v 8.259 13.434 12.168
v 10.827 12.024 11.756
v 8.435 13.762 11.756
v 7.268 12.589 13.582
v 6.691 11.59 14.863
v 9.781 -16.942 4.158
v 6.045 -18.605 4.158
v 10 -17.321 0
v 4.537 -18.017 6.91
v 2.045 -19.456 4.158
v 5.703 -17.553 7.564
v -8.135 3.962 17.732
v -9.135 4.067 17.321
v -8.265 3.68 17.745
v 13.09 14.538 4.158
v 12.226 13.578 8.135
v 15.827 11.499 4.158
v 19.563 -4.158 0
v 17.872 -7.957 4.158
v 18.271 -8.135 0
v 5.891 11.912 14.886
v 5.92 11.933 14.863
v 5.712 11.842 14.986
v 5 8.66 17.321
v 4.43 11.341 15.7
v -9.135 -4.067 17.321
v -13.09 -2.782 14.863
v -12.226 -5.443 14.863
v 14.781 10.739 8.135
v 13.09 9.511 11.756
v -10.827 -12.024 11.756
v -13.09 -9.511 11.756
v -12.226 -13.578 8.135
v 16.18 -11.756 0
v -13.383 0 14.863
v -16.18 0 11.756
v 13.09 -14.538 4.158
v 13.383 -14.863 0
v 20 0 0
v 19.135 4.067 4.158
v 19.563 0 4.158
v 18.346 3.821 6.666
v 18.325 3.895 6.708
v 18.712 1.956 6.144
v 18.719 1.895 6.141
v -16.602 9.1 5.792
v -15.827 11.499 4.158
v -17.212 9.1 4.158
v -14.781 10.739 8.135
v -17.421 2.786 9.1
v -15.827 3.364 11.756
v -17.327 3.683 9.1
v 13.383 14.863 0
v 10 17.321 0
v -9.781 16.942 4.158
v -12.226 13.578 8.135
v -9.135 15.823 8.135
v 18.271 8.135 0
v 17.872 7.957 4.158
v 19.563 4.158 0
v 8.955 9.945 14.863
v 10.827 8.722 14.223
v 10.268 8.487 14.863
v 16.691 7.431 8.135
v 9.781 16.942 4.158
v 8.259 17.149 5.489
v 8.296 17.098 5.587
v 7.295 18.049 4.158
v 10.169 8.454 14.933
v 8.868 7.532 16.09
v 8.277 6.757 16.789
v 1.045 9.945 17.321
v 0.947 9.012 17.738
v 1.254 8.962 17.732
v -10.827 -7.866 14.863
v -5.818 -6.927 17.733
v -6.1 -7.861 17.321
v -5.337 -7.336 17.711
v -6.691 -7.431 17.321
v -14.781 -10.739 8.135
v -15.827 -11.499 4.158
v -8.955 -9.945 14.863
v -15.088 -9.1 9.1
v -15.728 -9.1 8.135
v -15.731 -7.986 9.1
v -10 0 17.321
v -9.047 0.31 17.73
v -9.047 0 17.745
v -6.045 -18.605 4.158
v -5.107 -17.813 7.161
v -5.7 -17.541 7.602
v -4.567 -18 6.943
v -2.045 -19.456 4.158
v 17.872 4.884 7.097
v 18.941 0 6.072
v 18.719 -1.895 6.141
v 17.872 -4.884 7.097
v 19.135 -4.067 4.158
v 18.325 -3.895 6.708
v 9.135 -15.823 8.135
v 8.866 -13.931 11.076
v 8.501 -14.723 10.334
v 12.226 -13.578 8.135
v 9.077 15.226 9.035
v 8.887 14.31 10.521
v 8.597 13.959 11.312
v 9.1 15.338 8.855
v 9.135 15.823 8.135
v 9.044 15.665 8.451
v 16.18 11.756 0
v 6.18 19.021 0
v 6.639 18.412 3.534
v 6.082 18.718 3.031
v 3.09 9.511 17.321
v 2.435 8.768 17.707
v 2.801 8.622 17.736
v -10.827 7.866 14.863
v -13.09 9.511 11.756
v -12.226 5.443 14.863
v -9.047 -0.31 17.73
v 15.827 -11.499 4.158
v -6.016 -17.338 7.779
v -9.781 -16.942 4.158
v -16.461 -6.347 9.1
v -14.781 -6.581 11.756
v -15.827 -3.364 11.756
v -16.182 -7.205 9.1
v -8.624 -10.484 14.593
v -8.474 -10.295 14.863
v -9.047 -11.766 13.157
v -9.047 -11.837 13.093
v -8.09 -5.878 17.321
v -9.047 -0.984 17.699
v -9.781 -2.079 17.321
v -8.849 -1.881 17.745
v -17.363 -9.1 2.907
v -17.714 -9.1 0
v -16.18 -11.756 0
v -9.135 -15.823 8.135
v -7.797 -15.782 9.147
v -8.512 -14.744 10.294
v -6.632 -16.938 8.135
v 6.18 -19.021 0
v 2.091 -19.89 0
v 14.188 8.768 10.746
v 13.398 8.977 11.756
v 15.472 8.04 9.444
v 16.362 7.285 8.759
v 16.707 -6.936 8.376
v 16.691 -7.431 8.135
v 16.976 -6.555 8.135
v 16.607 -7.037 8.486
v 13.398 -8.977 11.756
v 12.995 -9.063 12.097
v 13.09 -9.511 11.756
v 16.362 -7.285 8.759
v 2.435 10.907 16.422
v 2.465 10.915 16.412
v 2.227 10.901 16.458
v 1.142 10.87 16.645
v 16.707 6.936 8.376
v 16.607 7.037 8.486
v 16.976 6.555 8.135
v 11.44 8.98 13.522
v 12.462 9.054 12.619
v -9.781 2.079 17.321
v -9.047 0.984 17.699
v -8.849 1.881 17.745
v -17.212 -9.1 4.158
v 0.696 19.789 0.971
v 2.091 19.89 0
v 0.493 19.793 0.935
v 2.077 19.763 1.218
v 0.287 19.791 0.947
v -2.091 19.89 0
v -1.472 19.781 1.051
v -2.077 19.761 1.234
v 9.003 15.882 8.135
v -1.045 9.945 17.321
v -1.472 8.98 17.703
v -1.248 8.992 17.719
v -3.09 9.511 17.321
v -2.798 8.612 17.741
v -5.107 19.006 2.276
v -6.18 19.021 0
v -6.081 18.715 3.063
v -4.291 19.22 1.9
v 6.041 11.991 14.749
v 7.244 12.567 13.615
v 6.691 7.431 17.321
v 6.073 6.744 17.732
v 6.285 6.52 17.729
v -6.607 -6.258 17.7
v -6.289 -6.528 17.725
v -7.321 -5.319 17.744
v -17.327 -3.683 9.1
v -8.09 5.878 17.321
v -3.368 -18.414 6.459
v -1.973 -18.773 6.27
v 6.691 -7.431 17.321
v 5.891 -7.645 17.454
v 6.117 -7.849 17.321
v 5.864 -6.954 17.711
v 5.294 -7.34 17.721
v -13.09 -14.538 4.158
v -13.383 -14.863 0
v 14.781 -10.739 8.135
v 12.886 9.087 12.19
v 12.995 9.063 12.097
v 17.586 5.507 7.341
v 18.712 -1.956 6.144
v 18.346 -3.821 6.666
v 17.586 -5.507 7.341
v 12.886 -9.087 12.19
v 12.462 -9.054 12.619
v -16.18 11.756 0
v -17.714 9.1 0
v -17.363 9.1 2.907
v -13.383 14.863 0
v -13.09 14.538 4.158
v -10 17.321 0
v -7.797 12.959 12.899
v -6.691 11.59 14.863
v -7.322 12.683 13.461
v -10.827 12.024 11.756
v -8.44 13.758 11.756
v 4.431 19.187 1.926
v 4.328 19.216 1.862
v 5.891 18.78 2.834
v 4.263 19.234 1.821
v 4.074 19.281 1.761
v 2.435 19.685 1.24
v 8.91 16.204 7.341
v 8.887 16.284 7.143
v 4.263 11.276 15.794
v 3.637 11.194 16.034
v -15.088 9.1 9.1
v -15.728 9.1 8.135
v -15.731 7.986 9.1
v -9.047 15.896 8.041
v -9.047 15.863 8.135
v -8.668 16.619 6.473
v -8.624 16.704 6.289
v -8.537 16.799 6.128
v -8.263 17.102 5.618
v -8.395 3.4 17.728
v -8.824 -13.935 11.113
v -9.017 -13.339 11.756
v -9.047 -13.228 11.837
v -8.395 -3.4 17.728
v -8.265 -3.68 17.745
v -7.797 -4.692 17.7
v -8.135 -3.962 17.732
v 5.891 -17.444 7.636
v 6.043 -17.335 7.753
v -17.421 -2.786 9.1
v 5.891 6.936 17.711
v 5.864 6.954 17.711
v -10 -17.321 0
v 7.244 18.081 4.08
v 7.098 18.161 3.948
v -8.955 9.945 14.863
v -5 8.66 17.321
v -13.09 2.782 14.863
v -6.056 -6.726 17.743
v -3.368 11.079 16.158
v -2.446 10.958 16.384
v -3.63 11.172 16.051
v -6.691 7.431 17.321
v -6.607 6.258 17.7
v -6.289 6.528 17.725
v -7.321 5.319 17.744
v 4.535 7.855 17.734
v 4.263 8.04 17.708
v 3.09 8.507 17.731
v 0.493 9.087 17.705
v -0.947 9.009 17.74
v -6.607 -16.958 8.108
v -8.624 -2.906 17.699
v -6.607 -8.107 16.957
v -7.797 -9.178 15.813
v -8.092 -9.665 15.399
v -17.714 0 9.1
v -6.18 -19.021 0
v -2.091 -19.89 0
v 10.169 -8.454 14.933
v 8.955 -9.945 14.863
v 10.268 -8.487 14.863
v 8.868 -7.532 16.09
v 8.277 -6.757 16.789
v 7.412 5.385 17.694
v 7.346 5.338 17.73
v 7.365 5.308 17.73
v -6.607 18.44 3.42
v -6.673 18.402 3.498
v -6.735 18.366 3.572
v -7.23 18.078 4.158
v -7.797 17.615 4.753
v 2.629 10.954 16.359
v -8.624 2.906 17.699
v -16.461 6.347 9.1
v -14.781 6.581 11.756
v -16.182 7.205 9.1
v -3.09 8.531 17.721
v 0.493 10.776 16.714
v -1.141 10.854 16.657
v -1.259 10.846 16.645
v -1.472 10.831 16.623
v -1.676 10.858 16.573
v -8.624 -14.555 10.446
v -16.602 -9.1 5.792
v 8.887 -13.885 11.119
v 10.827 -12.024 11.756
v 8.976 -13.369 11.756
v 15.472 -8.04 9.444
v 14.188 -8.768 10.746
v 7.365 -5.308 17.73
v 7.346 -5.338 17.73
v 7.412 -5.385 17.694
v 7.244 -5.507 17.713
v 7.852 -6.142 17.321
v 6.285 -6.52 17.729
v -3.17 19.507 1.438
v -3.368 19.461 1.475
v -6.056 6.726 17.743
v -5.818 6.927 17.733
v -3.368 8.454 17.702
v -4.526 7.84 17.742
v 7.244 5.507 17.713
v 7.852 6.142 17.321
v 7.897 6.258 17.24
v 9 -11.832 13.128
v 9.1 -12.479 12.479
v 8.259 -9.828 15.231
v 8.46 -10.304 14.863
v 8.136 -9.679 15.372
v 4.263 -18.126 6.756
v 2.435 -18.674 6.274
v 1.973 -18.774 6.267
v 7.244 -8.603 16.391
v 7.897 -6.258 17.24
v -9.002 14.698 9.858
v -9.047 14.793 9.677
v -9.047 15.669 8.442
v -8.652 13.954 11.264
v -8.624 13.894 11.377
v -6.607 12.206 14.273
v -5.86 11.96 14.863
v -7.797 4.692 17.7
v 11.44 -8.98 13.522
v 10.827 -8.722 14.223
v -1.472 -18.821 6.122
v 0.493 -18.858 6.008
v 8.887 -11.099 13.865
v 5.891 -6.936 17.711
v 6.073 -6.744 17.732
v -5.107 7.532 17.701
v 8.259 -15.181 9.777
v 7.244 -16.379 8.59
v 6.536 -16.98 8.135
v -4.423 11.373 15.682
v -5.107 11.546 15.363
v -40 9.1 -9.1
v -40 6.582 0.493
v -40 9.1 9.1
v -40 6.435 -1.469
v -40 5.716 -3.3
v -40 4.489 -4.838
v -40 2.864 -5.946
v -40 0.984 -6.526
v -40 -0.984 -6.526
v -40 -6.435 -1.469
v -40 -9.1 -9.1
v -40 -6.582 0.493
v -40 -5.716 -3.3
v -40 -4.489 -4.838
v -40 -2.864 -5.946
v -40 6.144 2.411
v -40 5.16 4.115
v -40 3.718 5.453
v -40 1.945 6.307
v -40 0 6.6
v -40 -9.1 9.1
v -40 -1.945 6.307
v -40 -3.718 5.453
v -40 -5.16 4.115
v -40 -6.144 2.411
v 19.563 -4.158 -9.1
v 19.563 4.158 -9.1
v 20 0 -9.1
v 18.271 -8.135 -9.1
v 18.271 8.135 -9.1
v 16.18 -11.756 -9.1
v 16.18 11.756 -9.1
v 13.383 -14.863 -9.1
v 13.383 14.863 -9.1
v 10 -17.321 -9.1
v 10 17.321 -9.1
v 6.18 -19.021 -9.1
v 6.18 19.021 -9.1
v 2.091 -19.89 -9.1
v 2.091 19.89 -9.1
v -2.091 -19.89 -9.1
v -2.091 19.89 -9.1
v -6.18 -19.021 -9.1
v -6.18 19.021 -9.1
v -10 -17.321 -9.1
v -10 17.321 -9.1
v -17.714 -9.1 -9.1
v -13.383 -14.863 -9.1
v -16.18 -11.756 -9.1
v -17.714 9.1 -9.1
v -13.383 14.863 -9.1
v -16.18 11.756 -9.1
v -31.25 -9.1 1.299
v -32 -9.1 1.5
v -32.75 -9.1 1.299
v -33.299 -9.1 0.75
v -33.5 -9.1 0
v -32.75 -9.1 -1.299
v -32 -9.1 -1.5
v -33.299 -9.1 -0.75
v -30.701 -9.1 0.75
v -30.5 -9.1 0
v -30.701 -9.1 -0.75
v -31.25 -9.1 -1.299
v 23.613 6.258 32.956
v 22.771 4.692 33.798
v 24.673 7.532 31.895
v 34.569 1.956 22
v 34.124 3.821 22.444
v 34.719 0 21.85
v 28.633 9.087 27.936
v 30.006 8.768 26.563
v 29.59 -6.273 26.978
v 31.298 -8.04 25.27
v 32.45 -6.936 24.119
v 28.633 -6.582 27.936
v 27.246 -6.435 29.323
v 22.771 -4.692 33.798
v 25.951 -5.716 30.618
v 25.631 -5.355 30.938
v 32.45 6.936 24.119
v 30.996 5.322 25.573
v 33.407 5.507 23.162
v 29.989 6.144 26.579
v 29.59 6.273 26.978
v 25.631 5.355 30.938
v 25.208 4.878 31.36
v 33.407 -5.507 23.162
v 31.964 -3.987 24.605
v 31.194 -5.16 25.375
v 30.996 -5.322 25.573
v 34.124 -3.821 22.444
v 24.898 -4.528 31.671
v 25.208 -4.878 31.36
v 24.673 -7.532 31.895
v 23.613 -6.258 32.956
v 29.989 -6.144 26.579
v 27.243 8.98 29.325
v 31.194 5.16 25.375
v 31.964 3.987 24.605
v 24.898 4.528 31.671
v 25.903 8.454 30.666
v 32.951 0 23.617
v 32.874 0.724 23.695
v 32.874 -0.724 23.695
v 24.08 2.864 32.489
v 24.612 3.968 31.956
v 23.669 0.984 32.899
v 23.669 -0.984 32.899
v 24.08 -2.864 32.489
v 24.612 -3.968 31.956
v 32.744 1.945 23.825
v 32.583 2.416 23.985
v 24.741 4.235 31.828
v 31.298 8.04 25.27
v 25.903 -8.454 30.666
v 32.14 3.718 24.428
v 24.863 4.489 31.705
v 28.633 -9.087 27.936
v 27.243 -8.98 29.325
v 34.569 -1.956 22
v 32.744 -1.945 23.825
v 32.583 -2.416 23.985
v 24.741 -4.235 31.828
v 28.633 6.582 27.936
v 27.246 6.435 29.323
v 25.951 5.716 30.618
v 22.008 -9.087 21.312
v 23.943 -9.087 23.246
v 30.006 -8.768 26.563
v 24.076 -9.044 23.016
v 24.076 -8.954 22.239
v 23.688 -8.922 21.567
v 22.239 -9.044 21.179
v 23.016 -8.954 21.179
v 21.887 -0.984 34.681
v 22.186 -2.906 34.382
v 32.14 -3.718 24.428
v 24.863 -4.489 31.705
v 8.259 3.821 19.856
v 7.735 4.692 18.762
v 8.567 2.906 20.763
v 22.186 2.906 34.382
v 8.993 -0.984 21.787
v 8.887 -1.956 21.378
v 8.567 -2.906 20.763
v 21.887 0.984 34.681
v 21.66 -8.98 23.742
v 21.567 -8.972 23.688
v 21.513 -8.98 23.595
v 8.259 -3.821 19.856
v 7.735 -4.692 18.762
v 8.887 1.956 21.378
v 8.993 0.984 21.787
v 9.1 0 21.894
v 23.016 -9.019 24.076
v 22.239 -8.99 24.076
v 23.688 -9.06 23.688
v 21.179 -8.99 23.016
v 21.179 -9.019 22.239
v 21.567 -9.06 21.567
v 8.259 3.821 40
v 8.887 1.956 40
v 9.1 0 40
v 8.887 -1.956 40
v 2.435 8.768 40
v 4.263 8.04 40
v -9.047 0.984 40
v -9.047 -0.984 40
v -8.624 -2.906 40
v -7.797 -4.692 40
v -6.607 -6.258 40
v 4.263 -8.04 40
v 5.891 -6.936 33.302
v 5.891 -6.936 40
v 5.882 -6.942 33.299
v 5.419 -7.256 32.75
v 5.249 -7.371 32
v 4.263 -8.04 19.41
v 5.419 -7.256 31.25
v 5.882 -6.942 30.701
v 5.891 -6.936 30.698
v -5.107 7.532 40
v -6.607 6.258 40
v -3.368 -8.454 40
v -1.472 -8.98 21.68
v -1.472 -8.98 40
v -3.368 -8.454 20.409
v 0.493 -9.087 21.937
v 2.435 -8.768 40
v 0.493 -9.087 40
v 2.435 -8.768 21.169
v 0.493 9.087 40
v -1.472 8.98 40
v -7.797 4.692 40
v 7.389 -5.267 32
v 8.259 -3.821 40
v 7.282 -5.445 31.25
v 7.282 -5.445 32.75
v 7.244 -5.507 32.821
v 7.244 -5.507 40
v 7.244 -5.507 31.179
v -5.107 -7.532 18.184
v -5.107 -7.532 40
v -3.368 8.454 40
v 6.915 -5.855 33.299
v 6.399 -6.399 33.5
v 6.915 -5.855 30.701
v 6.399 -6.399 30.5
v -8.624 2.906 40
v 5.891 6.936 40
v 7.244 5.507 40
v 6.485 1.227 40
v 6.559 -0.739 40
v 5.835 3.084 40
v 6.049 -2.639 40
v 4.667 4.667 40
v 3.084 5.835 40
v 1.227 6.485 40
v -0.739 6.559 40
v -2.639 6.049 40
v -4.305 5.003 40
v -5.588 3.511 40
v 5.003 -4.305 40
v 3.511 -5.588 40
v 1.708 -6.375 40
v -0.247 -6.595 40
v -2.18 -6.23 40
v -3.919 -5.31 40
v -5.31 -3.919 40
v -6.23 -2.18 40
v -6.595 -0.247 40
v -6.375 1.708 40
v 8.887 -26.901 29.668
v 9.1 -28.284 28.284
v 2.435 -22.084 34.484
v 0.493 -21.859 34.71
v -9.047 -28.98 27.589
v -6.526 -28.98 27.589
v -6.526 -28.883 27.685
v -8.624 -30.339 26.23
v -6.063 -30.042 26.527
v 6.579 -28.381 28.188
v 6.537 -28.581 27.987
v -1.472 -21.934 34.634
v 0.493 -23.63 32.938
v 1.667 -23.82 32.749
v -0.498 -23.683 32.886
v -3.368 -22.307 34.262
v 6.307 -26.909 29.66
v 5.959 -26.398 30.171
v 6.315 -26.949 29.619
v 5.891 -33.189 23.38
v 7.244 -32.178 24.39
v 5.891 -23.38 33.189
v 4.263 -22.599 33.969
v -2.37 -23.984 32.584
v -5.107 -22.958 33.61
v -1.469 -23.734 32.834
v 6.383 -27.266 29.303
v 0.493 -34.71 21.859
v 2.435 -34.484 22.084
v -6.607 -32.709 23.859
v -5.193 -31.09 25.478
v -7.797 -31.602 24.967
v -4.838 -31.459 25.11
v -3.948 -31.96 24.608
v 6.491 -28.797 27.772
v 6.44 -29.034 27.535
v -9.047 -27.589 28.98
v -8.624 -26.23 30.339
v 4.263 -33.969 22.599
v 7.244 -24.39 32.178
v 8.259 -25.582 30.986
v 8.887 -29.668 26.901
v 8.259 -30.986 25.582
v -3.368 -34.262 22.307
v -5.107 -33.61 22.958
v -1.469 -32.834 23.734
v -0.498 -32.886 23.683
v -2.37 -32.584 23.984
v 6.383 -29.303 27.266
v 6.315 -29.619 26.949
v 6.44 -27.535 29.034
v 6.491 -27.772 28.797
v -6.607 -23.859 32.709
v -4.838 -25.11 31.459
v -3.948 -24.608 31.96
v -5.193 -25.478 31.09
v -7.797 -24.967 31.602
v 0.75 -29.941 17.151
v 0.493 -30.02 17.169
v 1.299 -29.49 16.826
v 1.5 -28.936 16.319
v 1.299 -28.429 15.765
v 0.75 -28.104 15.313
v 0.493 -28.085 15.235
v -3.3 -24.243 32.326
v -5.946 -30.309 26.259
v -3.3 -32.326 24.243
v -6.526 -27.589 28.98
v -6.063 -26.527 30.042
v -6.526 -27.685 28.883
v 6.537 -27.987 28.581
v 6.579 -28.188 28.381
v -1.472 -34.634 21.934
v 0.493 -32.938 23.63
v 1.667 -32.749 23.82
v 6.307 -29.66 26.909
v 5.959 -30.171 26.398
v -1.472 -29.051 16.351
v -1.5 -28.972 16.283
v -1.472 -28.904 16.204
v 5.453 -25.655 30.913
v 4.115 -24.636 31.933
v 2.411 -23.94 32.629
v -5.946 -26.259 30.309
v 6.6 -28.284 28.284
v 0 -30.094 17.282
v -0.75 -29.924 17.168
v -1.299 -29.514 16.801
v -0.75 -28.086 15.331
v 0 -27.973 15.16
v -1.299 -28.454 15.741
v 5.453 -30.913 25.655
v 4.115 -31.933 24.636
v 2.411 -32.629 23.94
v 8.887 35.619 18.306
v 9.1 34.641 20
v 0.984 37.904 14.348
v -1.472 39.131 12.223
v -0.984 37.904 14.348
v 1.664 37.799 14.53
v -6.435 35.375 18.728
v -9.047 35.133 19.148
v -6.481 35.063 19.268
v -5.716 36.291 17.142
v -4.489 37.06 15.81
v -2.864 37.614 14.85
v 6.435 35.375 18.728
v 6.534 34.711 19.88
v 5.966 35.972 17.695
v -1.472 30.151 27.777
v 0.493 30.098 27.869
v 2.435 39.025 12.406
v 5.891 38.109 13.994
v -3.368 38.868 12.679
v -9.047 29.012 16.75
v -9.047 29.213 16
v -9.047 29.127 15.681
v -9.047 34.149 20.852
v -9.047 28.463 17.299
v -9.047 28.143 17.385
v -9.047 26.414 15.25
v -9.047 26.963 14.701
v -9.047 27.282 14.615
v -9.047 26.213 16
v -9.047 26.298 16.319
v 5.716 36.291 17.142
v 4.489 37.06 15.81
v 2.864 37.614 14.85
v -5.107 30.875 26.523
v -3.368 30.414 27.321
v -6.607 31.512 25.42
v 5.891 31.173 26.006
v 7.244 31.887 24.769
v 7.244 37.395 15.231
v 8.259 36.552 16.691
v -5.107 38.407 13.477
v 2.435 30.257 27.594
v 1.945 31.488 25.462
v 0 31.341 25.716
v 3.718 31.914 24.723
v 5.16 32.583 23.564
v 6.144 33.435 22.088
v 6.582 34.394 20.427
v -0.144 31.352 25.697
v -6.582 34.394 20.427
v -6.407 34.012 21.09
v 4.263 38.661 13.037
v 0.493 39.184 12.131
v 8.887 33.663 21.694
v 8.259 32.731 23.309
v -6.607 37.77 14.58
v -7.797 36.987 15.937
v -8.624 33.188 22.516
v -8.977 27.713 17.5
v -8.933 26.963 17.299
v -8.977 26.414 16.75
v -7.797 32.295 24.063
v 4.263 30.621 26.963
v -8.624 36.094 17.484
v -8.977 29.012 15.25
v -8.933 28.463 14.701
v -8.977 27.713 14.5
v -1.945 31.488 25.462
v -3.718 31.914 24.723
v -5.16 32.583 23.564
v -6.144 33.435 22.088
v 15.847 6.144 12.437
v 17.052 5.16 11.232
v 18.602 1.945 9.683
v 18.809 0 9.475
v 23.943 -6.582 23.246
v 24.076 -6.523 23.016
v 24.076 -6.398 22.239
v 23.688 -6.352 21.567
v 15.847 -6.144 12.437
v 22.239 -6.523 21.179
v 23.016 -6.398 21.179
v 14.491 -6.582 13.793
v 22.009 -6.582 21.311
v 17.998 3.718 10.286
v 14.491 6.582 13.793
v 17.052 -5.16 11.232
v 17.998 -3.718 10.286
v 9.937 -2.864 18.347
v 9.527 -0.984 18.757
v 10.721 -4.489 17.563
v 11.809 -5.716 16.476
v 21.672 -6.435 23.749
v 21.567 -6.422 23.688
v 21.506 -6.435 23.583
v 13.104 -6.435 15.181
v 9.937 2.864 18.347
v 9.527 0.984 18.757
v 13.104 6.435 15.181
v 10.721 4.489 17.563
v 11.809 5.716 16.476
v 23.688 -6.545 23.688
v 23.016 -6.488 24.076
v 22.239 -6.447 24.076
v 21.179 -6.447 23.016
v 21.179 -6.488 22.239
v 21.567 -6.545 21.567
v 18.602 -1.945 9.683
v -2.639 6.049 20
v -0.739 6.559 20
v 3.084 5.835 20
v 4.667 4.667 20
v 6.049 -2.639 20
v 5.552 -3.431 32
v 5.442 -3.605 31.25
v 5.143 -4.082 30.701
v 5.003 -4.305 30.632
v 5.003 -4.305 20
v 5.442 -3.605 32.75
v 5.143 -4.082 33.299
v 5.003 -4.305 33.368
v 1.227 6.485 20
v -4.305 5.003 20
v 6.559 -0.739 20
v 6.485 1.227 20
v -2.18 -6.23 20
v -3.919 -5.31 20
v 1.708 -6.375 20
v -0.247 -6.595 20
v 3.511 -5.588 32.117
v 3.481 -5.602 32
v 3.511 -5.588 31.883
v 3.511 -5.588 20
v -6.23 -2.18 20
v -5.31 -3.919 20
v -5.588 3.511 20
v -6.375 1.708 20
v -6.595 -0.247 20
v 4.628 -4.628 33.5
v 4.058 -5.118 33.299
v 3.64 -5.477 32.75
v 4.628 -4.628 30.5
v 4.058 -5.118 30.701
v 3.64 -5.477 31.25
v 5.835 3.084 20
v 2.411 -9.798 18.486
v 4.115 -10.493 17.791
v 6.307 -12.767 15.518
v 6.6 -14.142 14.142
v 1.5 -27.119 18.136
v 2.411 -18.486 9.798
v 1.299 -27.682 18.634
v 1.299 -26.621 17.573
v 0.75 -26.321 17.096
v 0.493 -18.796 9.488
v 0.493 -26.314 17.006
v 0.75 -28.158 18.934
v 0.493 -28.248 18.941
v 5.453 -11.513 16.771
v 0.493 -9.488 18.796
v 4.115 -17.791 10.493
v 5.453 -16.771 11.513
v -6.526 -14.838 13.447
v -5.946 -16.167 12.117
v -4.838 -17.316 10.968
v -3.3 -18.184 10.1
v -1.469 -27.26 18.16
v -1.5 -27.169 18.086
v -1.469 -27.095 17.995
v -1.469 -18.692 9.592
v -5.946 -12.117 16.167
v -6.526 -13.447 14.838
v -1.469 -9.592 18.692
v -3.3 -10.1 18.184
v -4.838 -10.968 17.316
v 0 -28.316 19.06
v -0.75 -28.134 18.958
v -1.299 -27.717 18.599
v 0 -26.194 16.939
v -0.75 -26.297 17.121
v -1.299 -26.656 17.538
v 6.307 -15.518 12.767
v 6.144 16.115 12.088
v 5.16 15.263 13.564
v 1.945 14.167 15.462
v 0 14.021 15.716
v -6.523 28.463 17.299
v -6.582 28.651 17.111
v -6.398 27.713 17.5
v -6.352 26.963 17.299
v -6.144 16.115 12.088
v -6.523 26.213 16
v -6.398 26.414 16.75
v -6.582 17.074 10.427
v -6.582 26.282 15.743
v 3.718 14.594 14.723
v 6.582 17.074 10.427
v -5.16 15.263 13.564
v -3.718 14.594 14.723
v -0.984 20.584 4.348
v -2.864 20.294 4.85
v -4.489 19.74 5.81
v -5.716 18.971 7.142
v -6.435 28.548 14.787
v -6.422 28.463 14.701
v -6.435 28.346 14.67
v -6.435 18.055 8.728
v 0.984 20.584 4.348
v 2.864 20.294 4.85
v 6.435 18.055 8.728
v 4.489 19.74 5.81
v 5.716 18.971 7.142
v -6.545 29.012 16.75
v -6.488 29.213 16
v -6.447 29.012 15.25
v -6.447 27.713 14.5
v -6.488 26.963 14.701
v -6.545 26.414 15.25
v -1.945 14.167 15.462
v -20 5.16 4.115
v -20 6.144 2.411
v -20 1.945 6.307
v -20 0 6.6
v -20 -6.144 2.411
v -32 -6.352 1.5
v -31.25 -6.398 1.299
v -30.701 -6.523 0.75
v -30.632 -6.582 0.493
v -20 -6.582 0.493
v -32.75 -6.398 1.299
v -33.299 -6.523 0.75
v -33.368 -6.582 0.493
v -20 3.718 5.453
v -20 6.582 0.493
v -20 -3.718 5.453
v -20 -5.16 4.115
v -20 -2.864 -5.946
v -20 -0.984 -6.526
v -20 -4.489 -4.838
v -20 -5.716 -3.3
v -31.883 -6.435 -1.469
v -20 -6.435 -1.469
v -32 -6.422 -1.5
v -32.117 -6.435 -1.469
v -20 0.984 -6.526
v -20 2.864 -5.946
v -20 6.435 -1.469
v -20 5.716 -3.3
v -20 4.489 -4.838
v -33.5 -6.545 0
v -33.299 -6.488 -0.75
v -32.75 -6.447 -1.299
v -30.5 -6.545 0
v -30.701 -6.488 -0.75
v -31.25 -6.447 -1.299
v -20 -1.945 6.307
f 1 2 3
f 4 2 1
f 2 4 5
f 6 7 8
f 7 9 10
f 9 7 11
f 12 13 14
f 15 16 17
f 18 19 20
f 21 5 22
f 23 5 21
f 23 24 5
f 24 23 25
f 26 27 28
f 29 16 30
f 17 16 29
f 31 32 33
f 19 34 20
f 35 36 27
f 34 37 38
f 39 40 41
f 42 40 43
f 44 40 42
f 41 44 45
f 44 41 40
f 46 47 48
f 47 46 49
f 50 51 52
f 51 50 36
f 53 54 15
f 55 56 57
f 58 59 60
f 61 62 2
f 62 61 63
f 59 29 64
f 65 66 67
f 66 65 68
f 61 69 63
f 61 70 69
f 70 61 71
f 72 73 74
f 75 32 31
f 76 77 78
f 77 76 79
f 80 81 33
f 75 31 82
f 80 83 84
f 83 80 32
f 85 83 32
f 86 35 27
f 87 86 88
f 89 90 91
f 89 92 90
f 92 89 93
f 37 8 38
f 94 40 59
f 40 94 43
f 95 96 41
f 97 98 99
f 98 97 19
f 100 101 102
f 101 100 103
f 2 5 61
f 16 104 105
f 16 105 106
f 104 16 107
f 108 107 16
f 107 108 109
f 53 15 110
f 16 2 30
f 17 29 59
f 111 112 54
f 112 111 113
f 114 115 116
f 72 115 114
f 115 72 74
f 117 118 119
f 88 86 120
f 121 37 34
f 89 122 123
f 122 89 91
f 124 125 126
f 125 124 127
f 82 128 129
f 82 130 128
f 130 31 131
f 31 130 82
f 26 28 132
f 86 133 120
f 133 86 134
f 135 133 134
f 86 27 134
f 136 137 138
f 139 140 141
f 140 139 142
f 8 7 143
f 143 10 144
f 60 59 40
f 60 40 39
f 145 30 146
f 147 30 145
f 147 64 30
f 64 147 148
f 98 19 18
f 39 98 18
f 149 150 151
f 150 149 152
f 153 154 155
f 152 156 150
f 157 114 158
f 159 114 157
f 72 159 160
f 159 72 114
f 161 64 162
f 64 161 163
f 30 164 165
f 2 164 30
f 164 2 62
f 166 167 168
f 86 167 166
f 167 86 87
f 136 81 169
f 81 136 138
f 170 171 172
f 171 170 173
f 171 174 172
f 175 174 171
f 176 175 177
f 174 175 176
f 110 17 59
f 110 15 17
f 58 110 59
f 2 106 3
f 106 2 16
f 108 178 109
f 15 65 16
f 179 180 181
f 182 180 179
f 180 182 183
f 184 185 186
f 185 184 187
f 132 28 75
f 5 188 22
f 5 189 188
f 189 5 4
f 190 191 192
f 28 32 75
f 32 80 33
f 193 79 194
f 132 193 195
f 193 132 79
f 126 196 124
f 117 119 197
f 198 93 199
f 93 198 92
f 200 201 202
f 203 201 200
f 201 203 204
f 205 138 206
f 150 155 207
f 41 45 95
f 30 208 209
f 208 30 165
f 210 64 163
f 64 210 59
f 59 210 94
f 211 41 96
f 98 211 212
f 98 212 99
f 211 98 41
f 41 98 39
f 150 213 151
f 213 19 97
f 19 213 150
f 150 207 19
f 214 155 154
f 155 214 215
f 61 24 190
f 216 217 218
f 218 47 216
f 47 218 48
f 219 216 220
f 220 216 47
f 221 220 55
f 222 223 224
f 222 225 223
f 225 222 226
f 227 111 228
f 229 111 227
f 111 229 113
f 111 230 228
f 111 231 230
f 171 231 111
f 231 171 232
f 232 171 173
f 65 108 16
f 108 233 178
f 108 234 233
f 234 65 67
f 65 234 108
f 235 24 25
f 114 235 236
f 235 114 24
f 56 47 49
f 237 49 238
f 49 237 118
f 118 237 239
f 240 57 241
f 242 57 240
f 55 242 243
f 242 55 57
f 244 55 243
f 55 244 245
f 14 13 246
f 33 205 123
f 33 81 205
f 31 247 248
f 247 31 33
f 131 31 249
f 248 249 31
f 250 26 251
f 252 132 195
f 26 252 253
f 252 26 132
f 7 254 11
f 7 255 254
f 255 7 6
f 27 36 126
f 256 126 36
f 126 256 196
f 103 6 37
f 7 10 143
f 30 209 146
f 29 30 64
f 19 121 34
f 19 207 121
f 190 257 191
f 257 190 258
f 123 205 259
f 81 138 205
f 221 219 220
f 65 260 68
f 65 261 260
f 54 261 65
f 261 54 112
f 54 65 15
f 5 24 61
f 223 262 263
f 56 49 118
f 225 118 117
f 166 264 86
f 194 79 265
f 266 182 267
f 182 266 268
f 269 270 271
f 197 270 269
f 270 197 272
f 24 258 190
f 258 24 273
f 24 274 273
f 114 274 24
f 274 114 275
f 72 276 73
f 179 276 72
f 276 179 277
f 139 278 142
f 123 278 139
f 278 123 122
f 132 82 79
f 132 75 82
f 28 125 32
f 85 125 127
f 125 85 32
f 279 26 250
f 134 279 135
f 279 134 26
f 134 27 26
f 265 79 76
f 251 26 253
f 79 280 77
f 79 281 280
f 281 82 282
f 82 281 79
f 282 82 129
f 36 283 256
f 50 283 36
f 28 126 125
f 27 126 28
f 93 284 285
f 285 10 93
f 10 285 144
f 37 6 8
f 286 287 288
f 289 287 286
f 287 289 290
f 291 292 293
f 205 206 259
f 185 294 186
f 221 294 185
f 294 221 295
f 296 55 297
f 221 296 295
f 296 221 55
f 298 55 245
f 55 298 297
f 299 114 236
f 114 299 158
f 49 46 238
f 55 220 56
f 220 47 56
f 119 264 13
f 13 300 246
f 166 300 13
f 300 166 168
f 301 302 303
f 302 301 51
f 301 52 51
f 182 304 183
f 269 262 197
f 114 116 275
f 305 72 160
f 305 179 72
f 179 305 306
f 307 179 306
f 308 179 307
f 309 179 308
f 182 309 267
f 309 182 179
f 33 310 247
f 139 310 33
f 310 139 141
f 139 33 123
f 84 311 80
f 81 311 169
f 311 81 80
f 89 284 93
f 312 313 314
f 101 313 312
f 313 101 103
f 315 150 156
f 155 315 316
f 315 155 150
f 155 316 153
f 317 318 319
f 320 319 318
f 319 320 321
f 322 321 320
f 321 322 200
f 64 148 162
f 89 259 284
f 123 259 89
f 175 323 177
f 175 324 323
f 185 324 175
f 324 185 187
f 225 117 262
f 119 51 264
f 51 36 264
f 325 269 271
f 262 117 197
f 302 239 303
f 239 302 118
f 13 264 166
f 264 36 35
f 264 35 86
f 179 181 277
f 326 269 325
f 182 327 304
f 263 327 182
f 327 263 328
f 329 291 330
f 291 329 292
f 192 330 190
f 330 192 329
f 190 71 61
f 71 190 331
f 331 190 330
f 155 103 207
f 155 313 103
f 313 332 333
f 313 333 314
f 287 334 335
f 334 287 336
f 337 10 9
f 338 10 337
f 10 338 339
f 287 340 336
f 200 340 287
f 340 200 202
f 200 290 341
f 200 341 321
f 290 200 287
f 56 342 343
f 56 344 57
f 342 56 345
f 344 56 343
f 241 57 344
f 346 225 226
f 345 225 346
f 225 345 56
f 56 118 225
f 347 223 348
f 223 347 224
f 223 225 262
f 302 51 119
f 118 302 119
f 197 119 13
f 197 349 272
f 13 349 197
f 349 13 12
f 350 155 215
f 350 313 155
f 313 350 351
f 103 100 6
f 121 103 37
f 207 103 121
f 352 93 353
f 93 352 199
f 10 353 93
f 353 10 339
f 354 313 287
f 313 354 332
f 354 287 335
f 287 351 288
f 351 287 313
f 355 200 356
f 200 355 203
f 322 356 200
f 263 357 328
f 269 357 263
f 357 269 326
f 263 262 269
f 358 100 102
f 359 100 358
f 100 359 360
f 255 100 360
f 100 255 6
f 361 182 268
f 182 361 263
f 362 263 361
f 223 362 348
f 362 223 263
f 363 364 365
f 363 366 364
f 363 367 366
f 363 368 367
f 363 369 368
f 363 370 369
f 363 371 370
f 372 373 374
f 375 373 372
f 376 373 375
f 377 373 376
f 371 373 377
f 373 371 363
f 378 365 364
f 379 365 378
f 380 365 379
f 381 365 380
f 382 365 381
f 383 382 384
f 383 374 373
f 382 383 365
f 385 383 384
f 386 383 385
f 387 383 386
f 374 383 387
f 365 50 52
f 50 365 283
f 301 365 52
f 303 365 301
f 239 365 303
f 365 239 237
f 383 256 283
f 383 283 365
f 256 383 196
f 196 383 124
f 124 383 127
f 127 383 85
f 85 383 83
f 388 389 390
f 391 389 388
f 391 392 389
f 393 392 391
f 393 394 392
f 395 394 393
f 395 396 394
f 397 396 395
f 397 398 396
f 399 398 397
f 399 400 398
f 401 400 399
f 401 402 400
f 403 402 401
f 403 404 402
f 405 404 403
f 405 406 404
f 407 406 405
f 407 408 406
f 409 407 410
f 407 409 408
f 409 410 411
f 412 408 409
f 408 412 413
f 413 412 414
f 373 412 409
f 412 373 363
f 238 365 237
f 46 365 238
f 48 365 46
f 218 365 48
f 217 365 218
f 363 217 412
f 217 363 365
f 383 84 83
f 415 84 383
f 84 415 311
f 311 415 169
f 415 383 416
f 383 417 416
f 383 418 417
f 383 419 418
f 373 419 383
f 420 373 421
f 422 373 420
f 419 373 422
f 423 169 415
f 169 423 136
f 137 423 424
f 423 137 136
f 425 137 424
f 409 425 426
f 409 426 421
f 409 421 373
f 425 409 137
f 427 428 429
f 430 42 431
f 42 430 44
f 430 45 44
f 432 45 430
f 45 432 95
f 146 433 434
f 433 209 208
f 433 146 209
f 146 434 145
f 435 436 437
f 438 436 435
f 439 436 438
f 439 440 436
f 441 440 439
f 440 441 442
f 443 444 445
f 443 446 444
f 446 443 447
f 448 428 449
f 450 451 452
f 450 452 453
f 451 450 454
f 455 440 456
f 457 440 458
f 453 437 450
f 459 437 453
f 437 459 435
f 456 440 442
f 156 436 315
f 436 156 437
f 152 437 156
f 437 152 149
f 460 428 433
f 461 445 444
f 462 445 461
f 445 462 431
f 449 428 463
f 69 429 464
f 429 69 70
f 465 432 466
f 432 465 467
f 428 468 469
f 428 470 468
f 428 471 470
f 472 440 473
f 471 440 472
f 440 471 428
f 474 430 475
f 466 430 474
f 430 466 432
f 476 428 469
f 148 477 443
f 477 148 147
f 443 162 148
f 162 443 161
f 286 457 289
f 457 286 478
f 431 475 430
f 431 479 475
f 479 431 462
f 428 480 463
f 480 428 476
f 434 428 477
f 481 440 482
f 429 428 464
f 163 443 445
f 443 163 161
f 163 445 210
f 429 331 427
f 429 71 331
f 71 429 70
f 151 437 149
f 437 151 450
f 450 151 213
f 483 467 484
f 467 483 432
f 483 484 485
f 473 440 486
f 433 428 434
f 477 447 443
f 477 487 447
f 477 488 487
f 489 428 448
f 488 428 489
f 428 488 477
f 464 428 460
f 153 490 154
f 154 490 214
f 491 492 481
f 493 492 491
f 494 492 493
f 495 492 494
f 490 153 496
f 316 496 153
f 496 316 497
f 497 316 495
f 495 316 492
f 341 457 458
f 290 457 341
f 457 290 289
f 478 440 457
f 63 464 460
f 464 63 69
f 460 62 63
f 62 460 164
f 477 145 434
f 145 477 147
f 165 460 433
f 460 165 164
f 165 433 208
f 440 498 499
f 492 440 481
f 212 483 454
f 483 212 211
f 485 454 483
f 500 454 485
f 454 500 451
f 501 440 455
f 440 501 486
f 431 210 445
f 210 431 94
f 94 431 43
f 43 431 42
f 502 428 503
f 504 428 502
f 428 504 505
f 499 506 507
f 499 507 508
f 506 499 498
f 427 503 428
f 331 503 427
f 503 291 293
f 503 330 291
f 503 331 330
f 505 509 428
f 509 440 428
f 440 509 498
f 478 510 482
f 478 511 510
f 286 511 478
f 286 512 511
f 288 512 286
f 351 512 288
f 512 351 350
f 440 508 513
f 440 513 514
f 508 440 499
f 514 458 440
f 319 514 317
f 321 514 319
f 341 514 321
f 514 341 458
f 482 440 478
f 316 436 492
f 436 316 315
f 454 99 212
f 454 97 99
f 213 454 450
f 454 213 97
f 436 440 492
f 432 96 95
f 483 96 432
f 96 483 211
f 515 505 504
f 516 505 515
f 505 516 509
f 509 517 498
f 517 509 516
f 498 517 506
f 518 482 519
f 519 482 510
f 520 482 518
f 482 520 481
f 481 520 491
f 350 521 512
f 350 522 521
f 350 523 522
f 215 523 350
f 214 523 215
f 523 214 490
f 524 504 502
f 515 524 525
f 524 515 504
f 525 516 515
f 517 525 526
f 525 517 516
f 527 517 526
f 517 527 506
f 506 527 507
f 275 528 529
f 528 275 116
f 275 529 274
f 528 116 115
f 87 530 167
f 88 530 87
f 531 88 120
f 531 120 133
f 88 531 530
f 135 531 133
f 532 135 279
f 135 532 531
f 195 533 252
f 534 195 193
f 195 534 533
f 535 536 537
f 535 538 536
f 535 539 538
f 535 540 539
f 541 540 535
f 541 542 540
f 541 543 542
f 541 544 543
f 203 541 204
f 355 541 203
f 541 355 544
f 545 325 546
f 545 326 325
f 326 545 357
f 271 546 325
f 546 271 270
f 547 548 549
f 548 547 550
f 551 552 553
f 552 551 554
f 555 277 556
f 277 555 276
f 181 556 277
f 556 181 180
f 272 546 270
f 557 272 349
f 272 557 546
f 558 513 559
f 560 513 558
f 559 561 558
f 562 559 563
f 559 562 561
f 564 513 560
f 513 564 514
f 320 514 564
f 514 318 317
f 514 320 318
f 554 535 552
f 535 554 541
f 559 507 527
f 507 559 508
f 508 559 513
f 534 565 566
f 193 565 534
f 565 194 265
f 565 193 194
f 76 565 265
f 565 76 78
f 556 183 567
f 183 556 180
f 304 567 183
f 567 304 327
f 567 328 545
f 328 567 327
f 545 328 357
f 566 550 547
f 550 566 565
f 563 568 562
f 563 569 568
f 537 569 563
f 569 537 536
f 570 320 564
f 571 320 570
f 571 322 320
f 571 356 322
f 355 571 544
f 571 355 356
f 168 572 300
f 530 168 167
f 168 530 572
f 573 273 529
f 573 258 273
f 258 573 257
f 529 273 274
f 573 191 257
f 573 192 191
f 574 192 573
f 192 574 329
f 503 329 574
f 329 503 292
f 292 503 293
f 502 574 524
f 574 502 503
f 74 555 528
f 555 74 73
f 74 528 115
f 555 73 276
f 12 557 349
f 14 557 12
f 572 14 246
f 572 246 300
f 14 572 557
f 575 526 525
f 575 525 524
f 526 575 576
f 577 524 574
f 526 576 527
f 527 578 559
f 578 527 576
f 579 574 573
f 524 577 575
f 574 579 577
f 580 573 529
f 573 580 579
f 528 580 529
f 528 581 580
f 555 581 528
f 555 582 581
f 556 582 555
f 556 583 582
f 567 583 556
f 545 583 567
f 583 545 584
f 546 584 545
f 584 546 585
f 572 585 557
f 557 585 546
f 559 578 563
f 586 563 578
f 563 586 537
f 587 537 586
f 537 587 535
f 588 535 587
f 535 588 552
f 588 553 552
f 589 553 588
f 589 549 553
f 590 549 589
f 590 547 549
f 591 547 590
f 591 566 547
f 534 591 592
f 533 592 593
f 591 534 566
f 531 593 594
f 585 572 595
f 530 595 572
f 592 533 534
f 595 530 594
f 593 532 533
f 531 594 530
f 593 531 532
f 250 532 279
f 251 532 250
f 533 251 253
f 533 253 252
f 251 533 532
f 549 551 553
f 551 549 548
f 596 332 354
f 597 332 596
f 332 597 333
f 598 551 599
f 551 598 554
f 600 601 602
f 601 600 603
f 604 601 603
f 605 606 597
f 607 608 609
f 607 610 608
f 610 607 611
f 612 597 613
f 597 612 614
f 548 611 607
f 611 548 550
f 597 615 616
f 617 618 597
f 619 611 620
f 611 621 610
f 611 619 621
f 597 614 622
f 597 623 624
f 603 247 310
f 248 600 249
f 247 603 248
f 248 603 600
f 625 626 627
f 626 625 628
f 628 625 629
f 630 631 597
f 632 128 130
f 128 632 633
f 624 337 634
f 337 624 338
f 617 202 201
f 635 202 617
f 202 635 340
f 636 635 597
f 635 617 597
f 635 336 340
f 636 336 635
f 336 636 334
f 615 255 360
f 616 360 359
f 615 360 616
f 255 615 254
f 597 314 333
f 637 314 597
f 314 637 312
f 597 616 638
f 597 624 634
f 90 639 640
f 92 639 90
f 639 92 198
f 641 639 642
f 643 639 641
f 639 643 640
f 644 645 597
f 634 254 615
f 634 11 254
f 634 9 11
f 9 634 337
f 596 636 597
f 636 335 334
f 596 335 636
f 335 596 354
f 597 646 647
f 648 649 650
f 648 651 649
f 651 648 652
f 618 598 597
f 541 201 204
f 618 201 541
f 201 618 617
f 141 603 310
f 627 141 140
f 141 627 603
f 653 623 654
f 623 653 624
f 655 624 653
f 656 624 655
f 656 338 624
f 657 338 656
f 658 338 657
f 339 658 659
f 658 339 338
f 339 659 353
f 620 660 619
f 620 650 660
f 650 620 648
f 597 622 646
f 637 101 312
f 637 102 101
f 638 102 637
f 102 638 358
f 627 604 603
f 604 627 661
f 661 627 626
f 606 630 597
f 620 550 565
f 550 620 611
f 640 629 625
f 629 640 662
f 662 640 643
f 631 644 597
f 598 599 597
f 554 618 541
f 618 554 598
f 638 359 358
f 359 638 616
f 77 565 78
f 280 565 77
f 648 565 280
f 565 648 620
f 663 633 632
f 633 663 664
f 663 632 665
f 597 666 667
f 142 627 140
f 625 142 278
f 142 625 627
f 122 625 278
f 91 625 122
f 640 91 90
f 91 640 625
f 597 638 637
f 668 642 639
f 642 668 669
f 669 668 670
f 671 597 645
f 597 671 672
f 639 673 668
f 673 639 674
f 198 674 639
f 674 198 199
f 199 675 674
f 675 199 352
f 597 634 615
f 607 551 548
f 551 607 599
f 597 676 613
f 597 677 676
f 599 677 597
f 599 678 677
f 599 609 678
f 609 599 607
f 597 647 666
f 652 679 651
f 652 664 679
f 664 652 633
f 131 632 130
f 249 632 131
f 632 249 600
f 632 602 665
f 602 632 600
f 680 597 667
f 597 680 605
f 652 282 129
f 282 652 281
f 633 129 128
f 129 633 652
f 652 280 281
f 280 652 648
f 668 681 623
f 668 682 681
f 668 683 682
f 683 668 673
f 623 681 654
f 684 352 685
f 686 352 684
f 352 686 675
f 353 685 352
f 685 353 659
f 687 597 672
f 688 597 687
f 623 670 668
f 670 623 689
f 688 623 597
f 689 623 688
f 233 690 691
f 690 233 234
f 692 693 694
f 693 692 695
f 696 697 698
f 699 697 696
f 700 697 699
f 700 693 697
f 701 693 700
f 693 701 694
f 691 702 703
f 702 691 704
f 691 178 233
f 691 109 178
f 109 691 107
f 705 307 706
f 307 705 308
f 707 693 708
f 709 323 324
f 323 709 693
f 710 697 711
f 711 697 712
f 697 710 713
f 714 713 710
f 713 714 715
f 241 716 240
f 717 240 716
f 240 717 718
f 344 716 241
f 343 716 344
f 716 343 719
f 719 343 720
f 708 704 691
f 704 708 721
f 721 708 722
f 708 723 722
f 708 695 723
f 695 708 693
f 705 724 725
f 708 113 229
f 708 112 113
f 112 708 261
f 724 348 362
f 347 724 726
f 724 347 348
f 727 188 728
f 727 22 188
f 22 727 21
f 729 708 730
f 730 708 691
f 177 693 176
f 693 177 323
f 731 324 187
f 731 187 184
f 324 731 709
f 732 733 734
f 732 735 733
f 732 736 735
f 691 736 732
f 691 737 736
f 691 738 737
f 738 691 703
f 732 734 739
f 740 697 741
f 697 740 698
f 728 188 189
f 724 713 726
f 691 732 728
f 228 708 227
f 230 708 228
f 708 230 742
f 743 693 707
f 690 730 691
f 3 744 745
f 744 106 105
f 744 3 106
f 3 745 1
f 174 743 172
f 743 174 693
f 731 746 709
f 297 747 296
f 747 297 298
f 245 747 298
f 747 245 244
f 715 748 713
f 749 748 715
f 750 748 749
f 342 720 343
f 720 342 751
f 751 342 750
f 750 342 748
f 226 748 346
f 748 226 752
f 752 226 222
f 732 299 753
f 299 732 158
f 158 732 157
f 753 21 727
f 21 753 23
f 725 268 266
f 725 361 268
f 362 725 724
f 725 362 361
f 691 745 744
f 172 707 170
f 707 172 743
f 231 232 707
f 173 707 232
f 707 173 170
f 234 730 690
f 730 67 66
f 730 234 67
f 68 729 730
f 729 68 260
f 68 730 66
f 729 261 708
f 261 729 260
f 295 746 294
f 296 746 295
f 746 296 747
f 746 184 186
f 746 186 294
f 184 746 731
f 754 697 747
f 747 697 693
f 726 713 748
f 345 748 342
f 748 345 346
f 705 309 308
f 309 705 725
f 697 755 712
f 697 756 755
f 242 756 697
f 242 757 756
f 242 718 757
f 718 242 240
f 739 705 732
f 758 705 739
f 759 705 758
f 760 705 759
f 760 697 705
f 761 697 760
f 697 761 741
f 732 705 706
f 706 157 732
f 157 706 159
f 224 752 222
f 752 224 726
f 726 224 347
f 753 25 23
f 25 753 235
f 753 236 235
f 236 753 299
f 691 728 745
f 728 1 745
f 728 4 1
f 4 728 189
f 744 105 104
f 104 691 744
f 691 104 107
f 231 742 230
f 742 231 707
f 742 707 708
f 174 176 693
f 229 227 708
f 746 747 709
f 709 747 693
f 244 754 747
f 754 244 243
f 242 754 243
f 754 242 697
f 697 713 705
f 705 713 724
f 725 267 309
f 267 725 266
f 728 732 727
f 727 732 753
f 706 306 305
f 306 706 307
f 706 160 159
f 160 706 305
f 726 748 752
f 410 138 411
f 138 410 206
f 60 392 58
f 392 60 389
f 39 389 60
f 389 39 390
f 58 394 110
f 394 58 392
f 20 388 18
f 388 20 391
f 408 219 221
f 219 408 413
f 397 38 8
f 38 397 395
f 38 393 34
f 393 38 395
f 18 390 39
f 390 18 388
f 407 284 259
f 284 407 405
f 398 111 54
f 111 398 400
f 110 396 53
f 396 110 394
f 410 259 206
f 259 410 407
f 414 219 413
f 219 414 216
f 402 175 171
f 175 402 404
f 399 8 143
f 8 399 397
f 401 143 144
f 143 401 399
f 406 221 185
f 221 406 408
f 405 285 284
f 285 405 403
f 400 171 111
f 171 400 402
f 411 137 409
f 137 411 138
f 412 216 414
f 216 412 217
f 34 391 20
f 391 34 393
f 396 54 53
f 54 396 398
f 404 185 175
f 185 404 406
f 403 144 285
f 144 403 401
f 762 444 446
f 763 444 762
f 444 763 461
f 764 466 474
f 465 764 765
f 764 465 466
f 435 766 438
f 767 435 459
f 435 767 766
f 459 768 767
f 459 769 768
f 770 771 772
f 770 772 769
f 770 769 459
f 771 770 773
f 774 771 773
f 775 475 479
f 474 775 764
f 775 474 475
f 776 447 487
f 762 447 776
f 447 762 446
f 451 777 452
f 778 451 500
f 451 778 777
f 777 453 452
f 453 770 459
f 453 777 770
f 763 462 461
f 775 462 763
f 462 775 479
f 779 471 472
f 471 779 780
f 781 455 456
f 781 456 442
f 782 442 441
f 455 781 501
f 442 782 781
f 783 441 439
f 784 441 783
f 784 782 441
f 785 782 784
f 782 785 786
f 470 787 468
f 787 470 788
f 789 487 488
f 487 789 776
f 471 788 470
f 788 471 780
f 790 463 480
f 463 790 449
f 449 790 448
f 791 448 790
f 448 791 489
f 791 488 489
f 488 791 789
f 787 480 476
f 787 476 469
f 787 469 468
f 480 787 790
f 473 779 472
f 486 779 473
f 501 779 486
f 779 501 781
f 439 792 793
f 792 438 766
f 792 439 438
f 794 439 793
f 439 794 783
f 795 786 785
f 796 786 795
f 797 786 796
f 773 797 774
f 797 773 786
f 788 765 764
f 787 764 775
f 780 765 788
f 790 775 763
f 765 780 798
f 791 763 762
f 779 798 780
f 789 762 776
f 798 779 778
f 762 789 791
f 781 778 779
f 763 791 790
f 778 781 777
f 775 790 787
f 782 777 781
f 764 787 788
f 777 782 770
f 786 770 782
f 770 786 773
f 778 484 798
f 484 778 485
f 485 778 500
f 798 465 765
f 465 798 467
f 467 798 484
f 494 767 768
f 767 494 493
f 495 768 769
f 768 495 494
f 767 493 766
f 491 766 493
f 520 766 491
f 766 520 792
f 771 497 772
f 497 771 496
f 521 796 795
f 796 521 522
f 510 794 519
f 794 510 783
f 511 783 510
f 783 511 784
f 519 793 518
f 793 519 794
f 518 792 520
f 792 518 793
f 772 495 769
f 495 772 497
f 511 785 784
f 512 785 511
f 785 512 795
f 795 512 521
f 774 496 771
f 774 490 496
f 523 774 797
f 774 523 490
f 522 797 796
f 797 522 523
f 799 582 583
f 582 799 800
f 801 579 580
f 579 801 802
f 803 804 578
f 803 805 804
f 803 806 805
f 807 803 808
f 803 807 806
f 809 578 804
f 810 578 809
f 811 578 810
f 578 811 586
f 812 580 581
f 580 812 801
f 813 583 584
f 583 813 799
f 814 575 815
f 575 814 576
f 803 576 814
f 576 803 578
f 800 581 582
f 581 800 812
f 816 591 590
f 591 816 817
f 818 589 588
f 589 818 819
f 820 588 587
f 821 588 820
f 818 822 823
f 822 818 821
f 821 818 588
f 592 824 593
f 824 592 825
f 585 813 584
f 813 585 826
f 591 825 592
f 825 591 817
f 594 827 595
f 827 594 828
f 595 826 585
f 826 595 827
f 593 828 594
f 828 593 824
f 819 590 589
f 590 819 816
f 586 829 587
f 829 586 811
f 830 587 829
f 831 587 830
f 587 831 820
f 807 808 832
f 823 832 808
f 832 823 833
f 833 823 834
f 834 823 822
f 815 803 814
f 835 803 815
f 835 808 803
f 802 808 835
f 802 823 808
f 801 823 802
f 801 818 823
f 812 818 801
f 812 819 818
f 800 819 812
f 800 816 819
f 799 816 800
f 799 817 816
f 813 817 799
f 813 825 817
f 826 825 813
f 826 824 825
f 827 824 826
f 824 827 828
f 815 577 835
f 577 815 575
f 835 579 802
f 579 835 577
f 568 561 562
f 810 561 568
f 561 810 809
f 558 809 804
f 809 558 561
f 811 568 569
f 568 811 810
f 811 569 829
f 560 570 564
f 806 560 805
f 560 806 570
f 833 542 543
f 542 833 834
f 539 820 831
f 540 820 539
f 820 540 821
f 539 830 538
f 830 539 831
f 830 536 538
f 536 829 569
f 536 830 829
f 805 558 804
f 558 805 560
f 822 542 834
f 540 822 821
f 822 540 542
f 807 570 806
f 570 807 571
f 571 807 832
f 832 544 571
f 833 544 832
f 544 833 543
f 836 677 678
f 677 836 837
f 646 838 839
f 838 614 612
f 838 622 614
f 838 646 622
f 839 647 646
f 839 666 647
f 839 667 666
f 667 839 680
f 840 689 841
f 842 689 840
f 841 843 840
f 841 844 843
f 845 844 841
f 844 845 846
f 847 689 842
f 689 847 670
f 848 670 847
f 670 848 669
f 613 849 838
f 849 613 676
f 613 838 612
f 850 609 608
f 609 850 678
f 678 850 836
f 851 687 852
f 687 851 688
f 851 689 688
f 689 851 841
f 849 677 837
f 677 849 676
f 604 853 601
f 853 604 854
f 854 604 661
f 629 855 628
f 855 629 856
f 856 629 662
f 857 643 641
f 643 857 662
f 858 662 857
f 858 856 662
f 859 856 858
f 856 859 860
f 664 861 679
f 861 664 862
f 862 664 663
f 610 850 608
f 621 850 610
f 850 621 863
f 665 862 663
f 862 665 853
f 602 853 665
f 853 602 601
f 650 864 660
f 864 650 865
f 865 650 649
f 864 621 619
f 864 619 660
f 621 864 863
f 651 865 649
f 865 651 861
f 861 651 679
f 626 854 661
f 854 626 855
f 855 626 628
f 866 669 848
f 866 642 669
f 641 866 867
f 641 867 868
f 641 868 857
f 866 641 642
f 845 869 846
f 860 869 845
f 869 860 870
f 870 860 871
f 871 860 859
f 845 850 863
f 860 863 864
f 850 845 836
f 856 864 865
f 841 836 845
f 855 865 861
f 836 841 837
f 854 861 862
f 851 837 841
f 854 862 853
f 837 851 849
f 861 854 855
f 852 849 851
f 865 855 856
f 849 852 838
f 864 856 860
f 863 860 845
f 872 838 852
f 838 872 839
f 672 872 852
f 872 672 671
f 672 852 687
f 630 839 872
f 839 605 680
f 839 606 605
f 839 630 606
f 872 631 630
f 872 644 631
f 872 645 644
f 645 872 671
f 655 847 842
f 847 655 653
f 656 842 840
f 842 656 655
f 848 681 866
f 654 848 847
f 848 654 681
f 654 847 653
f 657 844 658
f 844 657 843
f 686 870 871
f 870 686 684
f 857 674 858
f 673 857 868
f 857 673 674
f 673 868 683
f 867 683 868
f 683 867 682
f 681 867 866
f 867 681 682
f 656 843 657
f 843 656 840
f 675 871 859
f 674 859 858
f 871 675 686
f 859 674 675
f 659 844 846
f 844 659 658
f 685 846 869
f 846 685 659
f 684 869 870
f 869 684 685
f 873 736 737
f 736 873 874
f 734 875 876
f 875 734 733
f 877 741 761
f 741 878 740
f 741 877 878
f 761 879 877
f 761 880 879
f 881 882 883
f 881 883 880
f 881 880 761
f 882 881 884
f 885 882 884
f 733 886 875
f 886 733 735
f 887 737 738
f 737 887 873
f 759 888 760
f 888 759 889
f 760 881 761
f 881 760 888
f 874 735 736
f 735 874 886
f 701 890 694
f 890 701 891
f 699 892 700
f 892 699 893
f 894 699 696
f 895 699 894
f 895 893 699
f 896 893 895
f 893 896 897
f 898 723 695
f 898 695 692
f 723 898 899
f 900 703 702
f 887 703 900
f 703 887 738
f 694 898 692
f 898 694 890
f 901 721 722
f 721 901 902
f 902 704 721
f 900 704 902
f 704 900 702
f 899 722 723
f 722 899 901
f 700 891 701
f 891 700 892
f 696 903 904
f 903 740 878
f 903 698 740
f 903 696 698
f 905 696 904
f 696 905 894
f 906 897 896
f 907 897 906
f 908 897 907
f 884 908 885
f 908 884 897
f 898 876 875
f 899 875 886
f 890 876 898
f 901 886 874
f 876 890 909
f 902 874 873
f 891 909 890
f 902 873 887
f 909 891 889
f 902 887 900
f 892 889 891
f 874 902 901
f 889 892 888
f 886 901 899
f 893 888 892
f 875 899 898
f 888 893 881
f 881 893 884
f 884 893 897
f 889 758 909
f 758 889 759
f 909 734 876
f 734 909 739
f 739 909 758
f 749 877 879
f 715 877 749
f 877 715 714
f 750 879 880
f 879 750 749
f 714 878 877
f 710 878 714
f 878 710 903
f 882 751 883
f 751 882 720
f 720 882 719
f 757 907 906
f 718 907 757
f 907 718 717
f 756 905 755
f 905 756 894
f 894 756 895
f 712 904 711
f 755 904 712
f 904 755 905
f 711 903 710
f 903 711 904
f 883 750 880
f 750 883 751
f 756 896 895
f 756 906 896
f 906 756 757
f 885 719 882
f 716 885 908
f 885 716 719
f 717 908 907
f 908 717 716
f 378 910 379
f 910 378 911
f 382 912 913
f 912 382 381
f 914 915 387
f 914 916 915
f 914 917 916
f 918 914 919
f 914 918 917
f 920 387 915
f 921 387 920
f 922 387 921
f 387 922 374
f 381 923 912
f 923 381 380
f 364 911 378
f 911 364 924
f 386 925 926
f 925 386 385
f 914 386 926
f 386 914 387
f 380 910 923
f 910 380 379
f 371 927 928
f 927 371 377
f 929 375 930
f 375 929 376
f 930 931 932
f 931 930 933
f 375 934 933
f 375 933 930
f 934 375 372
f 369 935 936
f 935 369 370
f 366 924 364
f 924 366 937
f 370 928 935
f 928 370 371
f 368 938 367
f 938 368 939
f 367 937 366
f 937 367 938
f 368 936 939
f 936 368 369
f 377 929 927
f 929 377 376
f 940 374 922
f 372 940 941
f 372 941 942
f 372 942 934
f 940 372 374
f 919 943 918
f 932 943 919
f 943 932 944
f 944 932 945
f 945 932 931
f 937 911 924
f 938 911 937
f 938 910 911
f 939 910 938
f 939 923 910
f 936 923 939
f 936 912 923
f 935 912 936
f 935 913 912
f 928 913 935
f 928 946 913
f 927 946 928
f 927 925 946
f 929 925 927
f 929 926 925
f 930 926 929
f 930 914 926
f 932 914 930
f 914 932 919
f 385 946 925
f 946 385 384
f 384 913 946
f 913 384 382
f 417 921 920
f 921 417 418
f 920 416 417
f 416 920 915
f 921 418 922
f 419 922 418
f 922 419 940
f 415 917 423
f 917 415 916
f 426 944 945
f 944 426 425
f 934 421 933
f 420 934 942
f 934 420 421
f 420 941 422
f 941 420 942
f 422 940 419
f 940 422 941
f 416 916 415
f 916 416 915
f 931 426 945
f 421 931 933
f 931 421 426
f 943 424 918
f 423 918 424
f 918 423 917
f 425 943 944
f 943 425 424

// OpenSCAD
difference() {
	union() {
		difference() {
			sphere(r = 20);
			translate(v = [-100, -100, -100]) {
				cube(size = [200, 200, 100]);
			}
		}
		rotate(a = 45, v = [0, 1, 0]) {
			translate(v = [0, 0, 15]) {
				translate(v = [0, 0, 0]) {
					cylinder(h = 25, r = 9.1000000000);
				}
			}
		}
		rotate(a = 0, v = [0, 1, 0]) {
			translate(v = [0, 0, 15]) {
				translate(v = [0, 0, 0]) {
					cylinder(h = 25, r = 9.1000000000);
				}
			}
		}
		rotate(a = 45, v = [1, 0, 0]) {
			translate(v = [0, 0, 15]) {
				translate(v = [0, 0, 0]) {
					cylinder(h = 25, r = 9.1000000000);
				}
			}
		}
		rotate(a = -60, v = [1, 0, 0]) {
			translate(v = [0, 0, 15]) {
				translate(v = [0, 0, 0]) {
					cylinder(h = 25, r = 9.1000000000);
				}
			}
		}
		rotate(a = -90, v = [0, 1, 0]) {
			translate(v = [0, 0, 15]) {
				translate(v = [0, 0, 0]) {
					cylinder(h = 25, r = 9.1000000000);
				}
				translate(v = [-9.1000000000, -9.1000000000, 0]) {
					cube(size = [18.2000000000, 18.2000000000, 25]);
				}
			}
		}
		translate(v = [0, 0, -9.1000000000]) {
			cylinder(h = 9.1000000000, r = 20);
		}
	}
	union() {
		rotate(a = 45, v = [0, 1, 0]) {
			translate(v = [0, 0, 15]) {
				rotate(a = 0, v = [0, 0, 1]) {
					translate(v = [0, 0, 0]) {
						translate(v = [0, 0, 5]) {
							cylinder(h = 30, r = 6.6000000000);
						}
						translate(v = [0, -5, 17]) {
							rotate(a = 90, v = [1, 0, 0]) {
								cylinder($fn = 12, h = 6, r = 1.5000000000);
							}
						}
					}
				}
			}
		}
		rotate(a = 0, v = [0, 1, 0]) {
			translate(v = [0, 0, 15]) {
				rotate(a = 45, v = [0, 0, 1]) {
					translate(v = [0, 0, 0]) {
						translate(v = [0, 0, 5]) {
							cylinder(h = 30, r = 6.6000000000);
						}
						translate(v = [0, -5, 17]) {
							rotate(a = 90, v = [1, 0, 0]) {
								cylinder($fn = 12, h = 6, r = 1.5000000000);
							}
						}
					}
				}
			}
		}
		rotate(a = 45, v = [1, 0, 0]) {
			translate(v = [0, 0, 15]) {
				rotate(a = 0, v = [0, 0, 1]) {
					translate(v = [0, 0, 0]) {
						translate(v = [0, 0, 5]) {
							cylinder(h = 30, r = 6.6000000000);
						}
						translate(v = [0, -5, 17]) {
							rotate(a = 90, v = [1, 0, 0]) {
								cylinder($fn = 12, h = 6, r = 1.5000000000);
							}
						}
					}
				}
			}
		}
		rotate(a = -60, v = [1, 0, 0]) {
			translate(v = [0, 0, 15]) {
				rotate(a = -90, v = [0, 0, 1]) {
					translate(v = [0, 0, 0]) {
						translate(v = [0, 0, 5]) {
							cylinder(h = 30, r = 6.6000000000);
						}
						translate(v = [0, -5, 17]) {
							rotate(a = 90, v = [1, 0, 0]) {
								cylinder($fn = 12, h = 6, r = 1.5000000000);
							}
						}
					}
				}
			}
		}
		rotate(a = -90, v = [0, 1, 0]) {
			translate(v = [0, 0, 15]) {
				rotate(a = 0, v = [0, 0, 1]) {
					translate(v = [0, 0, 0]) {
						translate(v = [0, 0, 5]) {
							cylinder(h = 30, r = 6.6000000000);
						}
						translate(v = [0, -5, 17]) {
							rotate(a = 90, v = [1, 0, 0]) {
								cylinder($fn = 12, h = 6, r = 1.5000000000);
							}
						}
					}
				}
			}
		}
	}
}
